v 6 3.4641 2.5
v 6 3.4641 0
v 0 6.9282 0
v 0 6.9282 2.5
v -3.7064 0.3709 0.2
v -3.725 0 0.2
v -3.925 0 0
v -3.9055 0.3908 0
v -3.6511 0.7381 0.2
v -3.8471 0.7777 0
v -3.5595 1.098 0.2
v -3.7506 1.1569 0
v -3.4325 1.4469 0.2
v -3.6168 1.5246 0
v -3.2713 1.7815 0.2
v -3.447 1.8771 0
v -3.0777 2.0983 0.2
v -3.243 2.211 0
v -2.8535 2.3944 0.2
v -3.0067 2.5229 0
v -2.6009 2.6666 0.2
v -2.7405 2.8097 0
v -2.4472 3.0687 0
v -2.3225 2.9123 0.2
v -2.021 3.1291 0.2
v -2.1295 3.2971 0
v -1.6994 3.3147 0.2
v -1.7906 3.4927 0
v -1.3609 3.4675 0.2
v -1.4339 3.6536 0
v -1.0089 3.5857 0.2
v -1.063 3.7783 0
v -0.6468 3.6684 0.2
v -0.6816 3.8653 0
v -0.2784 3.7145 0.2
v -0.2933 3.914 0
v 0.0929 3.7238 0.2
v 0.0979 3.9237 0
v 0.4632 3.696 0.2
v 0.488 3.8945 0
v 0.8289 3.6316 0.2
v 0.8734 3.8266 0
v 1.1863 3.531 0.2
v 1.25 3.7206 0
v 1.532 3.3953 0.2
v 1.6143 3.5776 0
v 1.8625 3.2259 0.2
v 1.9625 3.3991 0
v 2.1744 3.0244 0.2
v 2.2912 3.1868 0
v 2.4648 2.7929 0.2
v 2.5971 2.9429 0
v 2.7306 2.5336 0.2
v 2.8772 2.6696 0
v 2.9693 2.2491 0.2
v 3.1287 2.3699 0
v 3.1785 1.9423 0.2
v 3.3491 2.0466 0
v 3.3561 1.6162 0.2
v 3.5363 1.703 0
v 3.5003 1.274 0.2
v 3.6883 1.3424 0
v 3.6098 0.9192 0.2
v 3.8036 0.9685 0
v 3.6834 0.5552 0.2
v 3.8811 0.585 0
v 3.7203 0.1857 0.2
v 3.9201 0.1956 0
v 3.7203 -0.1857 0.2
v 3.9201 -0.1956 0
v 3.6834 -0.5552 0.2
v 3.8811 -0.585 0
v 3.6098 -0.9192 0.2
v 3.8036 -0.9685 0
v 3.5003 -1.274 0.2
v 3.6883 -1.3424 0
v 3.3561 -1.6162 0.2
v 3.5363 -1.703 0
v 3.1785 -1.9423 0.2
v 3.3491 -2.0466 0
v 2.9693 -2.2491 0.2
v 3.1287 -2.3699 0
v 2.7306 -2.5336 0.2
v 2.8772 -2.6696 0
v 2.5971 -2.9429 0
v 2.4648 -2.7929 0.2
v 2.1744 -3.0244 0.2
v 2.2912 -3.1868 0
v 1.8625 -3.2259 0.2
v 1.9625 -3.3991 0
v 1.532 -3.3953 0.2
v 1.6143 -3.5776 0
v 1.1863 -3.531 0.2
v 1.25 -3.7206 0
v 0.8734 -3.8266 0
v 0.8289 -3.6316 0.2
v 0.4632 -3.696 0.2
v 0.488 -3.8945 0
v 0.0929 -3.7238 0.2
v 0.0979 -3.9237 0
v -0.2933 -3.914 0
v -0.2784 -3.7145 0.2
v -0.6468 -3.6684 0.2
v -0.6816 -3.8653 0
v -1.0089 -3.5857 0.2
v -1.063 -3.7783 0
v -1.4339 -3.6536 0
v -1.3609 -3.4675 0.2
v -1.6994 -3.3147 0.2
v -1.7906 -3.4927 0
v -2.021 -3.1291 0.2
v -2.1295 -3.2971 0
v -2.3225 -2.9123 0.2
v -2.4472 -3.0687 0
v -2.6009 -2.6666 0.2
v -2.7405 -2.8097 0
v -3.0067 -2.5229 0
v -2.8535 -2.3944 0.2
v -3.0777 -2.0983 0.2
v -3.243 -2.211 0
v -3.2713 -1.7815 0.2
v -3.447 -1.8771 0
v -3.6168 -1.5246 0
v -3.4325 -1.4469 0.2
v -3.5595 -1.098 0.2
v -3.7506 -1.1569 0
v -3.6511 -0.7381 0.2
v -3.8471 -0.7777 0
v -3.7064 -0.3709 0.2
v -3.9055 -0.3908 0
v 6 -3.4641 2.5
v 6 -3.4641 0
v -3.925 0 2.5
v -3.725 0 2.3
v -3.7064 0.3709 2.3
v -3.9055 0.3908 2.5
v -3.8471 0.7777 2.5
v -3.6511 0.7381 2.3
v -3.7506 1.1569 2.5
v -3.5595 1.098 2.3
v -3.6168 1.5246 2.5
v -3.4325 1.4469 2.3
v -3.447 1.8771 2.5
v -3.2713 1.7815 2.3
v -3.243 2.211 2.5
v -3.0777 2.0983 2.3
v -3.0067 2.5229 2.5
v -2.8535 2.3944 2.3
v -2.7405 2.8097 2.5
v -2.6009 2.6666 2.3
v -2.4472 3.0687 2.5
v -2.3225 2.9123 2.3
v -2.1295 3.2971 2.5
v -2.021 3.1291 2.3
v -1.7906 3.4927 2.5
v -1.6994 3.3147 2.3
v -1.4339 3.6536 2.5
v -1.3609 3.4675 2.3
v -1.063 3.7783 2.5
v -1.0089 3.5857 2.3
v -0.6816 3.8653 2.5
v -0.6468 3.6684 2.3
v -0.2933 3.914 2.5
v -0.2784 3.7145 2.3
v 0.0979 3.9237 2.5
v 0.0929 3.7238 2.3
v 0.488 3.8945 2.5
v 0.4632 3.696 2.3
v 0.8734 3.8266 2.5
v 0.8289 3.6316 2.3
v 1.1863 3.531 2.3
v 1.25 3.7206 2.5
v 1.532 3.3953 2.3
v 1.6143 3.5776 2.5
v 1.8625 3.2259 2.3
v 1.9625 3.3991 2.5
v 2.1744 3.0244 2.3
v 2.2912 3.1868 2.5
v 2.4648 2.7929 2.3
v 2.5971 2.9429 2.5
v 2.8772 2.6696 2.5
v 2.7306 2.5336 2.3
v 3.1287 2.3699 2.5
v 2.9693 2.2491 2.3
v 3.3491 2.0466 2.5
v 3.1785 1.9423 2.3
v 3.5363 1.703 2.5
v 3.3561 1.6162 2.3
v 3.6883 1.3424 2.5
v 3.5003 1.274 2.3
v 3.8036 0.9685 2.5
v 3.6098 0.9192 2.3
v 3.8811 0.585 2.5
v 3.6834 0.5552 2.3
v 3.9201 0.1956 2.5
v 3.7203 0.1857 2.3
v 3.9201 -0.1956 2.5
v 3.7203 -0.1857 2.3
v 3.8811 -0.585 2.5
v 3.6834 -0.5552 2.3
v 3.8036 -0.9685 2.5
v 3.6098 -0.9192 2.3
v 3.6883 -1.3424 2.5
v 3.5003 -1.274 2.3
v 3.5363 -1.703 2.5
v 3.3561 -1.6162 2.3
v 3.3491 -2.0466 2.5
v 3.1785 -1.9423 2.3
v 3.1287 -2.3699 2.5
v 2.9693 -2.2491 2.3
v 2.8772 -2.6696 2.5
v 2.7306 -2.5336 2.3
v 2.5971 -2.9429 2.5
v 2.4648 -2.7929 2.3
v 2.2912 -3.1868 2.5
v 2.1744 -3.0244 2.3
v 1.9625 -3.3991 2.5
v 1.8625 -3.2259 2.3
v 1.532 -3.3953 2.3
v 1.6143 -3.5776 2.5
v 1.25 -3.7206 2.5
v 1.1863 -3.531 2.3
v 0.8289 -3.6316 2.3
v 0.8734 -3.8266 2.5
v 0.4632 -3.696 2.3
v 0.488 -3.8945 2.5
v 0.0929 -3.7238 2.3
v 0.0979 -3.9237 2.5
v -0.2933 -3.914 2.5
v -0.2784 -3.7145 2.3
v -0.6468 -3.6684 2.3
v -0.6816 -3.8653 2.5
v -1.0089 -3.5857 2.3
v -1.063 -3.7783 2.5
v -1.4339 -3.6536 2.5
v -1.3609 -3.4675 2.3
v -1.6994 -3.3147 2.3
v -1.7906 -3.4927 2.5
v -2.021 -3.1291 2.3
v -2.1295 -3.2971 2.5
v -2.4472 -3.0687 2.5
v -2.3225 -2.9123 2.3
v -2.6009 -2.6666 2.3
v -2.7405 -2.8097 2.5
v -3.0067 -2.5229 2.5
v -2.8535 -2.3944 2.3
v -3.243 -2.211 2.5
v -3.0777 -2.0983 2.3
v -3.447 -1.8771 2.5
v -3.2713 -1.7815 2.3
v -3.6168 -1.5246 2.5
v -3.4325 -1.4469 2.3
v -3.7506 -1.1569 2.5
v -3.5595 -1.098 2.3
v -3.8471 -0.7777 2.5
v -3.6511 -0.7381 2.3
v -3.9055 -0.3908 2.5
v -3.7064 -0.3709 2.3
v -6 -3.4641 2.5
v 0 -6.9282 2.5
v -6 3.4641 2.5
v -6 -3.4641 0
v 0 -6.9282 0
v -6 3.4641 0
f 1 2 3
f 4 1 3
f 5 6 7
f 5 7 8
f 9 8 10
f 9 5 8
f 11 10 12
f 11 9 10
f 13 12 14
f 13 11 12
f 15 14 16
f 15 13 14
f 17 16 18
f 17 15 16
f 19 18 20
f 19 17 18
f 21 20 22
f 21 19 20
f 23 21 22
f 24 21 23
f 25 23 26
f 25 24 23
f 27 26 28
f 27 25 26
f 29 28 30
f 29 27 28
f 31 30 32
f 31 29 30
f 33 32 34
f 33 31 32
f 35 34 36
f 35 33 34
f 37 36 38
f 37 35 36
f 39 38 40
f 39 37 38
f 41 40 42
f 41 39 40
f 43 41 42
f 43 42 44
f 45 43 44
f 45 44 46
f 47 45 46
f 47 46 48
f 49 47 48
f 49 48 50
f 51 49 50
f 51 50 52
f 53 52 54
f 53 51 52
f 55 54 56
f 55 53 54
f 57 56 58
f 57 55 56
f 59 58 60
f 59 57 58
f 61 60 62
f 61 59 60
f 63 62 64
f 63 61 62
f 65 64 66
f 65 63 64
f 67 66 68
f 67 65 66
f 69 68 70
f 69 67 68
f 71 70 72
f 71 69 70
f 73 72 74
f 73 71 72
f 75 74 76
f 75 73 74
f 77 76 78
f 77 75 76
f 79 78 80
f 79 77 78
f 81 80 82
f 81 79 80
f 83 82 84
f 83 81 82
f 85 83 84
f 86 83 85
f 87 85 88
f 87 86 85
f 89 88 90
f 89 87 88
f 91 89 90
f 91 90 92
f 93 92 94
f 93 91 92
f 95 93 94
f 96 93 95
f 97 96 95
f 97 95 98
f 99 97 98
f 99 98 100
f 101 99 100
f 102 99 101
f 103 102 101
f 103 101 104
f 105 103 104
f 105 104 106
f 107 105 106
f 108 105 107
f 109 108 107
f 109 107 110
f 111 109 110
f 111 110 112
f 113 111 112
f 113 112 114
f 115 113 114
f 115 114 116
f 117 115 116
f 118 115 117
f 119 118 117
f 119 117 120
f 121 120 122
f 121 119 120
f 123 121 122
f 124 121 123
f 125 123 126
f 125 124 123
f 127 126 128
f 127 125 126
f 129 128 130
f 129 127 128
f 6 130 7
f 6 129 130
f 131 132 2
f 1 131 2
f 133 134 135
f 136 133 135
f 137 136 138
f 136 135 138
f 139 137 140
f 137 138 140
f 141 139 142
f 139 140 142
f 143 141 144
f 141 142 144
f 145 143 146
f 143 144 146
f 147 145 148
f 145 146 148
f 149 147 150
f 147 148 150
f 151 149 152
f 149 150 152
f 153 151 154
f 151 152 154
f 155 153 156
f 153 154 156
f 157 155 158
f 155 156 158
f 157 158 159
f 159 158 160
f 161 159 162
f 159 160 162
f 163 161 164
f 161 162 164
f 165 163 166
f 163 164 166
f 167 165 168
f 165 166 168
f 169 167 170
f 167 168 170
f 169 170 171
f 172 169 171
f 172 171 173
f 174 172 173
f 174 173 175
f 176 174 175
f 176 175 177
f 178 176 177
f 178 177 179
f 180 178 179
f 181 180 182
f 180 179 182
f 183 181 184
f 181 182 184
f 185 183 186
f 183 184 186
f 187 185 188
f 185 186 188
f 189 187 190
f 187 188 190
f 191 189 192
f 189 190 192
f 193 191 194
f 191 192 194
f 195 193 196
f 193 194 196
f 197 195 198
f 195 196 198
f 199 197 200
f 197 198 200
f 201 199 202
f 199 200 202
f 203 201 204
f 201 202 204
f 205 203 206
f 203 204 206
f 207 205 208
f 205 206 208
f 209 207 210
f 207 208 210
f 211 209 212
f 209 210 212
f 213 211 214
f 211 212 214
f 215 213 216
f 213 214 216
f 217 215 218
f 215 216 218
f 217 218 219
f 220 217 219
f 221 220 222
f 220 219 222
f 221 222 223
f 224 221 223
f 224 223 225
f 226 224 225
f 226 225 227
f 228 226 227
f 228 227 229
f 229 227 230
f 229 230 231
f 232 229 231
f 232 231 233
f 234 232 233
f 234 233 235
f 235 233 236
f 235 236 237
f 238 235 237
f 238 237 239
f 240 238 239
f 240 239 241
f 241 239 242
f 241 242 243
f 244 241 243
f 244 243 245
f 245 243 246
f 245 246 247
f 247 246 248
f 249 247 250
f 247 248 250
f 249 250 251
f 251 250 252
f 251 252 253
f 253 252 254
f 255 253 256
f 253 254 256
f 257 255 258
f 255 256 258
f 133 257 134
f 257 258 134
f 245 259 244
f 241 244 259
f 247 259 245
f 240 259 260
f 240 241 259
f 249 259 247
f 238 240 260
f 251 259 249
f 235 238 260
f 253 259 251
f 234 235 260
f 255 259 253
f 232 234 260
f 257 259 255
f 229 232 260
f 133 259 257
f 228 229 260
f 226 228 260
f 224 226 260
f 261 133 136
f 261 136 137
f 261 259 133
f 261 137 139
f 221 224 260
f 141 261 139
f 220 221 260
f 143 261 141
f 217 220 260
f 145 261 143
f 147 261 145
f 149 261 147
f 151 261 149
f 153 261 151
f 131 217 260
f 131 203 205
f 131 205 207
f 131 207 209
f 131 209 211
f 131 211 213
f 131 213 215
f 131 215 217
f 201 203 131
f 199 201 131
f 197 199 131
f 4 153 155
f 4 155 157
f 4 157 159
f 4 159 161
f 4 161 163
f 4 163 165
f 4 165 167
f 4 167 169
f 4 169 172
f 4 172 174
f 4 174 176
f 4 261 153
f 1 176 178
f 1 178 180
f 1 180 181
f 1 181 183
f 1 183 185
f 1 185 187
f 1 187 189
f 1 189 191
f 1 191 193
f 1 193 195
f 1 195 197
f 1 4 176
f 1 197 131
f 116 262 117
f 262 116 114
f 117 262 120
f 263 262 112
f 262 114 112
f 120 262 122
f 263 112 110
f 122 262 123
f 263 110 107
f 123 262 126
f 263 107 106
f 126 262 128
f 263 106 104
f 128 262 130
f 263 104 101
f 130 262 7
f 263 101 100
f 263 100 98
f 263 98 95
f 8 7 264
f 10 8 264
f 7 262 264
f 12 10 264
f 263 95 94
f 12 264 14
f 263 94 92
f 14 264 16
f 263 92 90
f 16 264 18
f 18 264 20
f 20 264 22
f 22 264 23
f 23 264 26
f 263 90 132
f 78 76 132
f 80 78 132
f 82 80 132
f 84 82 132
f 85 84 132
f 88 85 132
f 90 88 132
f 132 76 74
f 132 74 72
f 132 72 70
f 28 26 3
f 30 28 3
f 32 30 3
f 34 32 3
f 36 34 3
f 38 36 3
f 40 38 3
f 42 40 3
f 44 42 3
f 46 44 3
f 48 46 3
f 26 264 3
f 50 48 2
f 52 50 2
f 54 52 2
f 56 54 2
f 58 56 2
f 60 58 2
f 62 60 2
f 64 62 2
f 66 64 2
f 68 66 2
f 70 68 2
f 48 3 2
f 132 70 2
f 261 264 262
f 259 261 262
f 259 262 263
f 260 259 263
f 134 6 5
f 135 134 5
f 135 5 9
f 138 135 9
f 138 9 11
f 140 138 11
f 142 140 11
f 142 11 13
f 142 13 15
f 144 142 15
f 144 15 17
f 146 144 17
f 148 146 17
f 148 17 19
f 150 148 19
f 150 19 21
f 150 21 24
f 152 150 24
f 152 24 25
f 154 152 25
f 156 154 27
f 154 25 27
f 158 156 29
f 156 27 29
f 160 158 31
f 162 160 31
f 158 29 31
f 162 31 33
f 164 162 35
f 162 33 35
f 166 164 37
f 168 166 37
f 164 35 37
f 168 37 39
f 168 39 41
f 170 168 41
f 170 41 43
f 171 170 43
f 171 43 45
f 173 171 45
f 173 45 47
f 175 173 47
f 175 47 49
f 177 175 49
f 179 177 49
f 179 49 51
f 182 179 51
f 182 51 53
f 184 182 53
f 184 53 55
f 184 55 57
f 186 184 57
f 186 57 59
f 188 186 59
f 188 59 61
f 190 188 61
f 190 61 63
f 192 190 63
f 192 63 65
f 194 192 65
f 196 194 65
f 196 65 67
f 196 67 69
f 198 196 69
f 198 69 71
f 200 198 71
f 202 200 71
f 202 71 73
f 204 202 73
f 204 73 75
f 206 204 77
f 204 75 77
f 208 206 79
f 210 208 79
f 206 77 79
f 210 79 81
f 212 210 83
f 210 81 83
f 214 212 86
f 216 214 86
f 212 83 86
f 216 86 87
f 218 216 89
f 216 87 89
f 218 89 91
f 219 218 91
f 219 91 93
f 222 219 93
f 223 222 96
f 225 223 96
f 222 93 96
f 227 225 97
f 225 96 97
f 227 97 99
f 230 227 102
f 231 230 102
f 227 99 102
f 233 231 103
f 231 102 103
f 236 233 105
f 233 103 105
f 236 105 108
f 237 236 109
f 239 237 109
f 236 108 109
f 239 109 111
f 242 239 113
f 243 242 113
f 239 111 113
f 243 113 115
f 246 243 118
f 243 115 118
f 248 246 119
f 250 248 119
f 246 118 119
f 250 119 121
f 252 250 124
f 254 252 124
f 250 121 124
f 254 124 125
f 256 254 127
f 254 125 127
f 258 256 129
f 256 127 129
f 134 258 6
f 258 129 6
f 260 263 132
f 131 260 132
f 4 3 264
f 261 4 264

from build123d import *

# Parameters (mm, degrees)
EXTRUDE_1_DEPTH     = 2.5
SKETCH_3_R          = 3.724956963
CUT_EXTRUDE_1_DEPTH = 6.5
CHAMFER_1_SIZE      = 0.2


with BuildPart() as part:
    # 草图2 → 凸台-拉伸1 (new body)
    with BuildSketch(Plane.XY):
        Polygon((0, 6.92820323), (-6, 3.464101615), (-6, -3.464101615), (0, -6.92820323), (6, -3.464101615), (6, 3.464101615), align=None)
    extrude(amount=EXTRUDE_1_DEPTH)

    # 草图3 → 切除-拉伸1 (cut)
    with BuildSketch(Plane(origin=(0, 0, 0), x_dir=(-1, 0, 0), z_dir=(0, 0, -1))):
        Circle(SKETCH_3_R)
    extrude(amount=-CUT_EXTRUDE_1_DEPTH, mode=Mode.SUBTRACT)

    # 倒角1
    chamfer_1_edges = [part.edges().sort_by_distance(p)[0] for p in [
        (3.724956963, 0, 2.5),
        (3.724956963, 0, 0),
    ]]
    chamfer(chamfer_1_edges, length=CHAMFER_1_SIZE)


solid = part.part
